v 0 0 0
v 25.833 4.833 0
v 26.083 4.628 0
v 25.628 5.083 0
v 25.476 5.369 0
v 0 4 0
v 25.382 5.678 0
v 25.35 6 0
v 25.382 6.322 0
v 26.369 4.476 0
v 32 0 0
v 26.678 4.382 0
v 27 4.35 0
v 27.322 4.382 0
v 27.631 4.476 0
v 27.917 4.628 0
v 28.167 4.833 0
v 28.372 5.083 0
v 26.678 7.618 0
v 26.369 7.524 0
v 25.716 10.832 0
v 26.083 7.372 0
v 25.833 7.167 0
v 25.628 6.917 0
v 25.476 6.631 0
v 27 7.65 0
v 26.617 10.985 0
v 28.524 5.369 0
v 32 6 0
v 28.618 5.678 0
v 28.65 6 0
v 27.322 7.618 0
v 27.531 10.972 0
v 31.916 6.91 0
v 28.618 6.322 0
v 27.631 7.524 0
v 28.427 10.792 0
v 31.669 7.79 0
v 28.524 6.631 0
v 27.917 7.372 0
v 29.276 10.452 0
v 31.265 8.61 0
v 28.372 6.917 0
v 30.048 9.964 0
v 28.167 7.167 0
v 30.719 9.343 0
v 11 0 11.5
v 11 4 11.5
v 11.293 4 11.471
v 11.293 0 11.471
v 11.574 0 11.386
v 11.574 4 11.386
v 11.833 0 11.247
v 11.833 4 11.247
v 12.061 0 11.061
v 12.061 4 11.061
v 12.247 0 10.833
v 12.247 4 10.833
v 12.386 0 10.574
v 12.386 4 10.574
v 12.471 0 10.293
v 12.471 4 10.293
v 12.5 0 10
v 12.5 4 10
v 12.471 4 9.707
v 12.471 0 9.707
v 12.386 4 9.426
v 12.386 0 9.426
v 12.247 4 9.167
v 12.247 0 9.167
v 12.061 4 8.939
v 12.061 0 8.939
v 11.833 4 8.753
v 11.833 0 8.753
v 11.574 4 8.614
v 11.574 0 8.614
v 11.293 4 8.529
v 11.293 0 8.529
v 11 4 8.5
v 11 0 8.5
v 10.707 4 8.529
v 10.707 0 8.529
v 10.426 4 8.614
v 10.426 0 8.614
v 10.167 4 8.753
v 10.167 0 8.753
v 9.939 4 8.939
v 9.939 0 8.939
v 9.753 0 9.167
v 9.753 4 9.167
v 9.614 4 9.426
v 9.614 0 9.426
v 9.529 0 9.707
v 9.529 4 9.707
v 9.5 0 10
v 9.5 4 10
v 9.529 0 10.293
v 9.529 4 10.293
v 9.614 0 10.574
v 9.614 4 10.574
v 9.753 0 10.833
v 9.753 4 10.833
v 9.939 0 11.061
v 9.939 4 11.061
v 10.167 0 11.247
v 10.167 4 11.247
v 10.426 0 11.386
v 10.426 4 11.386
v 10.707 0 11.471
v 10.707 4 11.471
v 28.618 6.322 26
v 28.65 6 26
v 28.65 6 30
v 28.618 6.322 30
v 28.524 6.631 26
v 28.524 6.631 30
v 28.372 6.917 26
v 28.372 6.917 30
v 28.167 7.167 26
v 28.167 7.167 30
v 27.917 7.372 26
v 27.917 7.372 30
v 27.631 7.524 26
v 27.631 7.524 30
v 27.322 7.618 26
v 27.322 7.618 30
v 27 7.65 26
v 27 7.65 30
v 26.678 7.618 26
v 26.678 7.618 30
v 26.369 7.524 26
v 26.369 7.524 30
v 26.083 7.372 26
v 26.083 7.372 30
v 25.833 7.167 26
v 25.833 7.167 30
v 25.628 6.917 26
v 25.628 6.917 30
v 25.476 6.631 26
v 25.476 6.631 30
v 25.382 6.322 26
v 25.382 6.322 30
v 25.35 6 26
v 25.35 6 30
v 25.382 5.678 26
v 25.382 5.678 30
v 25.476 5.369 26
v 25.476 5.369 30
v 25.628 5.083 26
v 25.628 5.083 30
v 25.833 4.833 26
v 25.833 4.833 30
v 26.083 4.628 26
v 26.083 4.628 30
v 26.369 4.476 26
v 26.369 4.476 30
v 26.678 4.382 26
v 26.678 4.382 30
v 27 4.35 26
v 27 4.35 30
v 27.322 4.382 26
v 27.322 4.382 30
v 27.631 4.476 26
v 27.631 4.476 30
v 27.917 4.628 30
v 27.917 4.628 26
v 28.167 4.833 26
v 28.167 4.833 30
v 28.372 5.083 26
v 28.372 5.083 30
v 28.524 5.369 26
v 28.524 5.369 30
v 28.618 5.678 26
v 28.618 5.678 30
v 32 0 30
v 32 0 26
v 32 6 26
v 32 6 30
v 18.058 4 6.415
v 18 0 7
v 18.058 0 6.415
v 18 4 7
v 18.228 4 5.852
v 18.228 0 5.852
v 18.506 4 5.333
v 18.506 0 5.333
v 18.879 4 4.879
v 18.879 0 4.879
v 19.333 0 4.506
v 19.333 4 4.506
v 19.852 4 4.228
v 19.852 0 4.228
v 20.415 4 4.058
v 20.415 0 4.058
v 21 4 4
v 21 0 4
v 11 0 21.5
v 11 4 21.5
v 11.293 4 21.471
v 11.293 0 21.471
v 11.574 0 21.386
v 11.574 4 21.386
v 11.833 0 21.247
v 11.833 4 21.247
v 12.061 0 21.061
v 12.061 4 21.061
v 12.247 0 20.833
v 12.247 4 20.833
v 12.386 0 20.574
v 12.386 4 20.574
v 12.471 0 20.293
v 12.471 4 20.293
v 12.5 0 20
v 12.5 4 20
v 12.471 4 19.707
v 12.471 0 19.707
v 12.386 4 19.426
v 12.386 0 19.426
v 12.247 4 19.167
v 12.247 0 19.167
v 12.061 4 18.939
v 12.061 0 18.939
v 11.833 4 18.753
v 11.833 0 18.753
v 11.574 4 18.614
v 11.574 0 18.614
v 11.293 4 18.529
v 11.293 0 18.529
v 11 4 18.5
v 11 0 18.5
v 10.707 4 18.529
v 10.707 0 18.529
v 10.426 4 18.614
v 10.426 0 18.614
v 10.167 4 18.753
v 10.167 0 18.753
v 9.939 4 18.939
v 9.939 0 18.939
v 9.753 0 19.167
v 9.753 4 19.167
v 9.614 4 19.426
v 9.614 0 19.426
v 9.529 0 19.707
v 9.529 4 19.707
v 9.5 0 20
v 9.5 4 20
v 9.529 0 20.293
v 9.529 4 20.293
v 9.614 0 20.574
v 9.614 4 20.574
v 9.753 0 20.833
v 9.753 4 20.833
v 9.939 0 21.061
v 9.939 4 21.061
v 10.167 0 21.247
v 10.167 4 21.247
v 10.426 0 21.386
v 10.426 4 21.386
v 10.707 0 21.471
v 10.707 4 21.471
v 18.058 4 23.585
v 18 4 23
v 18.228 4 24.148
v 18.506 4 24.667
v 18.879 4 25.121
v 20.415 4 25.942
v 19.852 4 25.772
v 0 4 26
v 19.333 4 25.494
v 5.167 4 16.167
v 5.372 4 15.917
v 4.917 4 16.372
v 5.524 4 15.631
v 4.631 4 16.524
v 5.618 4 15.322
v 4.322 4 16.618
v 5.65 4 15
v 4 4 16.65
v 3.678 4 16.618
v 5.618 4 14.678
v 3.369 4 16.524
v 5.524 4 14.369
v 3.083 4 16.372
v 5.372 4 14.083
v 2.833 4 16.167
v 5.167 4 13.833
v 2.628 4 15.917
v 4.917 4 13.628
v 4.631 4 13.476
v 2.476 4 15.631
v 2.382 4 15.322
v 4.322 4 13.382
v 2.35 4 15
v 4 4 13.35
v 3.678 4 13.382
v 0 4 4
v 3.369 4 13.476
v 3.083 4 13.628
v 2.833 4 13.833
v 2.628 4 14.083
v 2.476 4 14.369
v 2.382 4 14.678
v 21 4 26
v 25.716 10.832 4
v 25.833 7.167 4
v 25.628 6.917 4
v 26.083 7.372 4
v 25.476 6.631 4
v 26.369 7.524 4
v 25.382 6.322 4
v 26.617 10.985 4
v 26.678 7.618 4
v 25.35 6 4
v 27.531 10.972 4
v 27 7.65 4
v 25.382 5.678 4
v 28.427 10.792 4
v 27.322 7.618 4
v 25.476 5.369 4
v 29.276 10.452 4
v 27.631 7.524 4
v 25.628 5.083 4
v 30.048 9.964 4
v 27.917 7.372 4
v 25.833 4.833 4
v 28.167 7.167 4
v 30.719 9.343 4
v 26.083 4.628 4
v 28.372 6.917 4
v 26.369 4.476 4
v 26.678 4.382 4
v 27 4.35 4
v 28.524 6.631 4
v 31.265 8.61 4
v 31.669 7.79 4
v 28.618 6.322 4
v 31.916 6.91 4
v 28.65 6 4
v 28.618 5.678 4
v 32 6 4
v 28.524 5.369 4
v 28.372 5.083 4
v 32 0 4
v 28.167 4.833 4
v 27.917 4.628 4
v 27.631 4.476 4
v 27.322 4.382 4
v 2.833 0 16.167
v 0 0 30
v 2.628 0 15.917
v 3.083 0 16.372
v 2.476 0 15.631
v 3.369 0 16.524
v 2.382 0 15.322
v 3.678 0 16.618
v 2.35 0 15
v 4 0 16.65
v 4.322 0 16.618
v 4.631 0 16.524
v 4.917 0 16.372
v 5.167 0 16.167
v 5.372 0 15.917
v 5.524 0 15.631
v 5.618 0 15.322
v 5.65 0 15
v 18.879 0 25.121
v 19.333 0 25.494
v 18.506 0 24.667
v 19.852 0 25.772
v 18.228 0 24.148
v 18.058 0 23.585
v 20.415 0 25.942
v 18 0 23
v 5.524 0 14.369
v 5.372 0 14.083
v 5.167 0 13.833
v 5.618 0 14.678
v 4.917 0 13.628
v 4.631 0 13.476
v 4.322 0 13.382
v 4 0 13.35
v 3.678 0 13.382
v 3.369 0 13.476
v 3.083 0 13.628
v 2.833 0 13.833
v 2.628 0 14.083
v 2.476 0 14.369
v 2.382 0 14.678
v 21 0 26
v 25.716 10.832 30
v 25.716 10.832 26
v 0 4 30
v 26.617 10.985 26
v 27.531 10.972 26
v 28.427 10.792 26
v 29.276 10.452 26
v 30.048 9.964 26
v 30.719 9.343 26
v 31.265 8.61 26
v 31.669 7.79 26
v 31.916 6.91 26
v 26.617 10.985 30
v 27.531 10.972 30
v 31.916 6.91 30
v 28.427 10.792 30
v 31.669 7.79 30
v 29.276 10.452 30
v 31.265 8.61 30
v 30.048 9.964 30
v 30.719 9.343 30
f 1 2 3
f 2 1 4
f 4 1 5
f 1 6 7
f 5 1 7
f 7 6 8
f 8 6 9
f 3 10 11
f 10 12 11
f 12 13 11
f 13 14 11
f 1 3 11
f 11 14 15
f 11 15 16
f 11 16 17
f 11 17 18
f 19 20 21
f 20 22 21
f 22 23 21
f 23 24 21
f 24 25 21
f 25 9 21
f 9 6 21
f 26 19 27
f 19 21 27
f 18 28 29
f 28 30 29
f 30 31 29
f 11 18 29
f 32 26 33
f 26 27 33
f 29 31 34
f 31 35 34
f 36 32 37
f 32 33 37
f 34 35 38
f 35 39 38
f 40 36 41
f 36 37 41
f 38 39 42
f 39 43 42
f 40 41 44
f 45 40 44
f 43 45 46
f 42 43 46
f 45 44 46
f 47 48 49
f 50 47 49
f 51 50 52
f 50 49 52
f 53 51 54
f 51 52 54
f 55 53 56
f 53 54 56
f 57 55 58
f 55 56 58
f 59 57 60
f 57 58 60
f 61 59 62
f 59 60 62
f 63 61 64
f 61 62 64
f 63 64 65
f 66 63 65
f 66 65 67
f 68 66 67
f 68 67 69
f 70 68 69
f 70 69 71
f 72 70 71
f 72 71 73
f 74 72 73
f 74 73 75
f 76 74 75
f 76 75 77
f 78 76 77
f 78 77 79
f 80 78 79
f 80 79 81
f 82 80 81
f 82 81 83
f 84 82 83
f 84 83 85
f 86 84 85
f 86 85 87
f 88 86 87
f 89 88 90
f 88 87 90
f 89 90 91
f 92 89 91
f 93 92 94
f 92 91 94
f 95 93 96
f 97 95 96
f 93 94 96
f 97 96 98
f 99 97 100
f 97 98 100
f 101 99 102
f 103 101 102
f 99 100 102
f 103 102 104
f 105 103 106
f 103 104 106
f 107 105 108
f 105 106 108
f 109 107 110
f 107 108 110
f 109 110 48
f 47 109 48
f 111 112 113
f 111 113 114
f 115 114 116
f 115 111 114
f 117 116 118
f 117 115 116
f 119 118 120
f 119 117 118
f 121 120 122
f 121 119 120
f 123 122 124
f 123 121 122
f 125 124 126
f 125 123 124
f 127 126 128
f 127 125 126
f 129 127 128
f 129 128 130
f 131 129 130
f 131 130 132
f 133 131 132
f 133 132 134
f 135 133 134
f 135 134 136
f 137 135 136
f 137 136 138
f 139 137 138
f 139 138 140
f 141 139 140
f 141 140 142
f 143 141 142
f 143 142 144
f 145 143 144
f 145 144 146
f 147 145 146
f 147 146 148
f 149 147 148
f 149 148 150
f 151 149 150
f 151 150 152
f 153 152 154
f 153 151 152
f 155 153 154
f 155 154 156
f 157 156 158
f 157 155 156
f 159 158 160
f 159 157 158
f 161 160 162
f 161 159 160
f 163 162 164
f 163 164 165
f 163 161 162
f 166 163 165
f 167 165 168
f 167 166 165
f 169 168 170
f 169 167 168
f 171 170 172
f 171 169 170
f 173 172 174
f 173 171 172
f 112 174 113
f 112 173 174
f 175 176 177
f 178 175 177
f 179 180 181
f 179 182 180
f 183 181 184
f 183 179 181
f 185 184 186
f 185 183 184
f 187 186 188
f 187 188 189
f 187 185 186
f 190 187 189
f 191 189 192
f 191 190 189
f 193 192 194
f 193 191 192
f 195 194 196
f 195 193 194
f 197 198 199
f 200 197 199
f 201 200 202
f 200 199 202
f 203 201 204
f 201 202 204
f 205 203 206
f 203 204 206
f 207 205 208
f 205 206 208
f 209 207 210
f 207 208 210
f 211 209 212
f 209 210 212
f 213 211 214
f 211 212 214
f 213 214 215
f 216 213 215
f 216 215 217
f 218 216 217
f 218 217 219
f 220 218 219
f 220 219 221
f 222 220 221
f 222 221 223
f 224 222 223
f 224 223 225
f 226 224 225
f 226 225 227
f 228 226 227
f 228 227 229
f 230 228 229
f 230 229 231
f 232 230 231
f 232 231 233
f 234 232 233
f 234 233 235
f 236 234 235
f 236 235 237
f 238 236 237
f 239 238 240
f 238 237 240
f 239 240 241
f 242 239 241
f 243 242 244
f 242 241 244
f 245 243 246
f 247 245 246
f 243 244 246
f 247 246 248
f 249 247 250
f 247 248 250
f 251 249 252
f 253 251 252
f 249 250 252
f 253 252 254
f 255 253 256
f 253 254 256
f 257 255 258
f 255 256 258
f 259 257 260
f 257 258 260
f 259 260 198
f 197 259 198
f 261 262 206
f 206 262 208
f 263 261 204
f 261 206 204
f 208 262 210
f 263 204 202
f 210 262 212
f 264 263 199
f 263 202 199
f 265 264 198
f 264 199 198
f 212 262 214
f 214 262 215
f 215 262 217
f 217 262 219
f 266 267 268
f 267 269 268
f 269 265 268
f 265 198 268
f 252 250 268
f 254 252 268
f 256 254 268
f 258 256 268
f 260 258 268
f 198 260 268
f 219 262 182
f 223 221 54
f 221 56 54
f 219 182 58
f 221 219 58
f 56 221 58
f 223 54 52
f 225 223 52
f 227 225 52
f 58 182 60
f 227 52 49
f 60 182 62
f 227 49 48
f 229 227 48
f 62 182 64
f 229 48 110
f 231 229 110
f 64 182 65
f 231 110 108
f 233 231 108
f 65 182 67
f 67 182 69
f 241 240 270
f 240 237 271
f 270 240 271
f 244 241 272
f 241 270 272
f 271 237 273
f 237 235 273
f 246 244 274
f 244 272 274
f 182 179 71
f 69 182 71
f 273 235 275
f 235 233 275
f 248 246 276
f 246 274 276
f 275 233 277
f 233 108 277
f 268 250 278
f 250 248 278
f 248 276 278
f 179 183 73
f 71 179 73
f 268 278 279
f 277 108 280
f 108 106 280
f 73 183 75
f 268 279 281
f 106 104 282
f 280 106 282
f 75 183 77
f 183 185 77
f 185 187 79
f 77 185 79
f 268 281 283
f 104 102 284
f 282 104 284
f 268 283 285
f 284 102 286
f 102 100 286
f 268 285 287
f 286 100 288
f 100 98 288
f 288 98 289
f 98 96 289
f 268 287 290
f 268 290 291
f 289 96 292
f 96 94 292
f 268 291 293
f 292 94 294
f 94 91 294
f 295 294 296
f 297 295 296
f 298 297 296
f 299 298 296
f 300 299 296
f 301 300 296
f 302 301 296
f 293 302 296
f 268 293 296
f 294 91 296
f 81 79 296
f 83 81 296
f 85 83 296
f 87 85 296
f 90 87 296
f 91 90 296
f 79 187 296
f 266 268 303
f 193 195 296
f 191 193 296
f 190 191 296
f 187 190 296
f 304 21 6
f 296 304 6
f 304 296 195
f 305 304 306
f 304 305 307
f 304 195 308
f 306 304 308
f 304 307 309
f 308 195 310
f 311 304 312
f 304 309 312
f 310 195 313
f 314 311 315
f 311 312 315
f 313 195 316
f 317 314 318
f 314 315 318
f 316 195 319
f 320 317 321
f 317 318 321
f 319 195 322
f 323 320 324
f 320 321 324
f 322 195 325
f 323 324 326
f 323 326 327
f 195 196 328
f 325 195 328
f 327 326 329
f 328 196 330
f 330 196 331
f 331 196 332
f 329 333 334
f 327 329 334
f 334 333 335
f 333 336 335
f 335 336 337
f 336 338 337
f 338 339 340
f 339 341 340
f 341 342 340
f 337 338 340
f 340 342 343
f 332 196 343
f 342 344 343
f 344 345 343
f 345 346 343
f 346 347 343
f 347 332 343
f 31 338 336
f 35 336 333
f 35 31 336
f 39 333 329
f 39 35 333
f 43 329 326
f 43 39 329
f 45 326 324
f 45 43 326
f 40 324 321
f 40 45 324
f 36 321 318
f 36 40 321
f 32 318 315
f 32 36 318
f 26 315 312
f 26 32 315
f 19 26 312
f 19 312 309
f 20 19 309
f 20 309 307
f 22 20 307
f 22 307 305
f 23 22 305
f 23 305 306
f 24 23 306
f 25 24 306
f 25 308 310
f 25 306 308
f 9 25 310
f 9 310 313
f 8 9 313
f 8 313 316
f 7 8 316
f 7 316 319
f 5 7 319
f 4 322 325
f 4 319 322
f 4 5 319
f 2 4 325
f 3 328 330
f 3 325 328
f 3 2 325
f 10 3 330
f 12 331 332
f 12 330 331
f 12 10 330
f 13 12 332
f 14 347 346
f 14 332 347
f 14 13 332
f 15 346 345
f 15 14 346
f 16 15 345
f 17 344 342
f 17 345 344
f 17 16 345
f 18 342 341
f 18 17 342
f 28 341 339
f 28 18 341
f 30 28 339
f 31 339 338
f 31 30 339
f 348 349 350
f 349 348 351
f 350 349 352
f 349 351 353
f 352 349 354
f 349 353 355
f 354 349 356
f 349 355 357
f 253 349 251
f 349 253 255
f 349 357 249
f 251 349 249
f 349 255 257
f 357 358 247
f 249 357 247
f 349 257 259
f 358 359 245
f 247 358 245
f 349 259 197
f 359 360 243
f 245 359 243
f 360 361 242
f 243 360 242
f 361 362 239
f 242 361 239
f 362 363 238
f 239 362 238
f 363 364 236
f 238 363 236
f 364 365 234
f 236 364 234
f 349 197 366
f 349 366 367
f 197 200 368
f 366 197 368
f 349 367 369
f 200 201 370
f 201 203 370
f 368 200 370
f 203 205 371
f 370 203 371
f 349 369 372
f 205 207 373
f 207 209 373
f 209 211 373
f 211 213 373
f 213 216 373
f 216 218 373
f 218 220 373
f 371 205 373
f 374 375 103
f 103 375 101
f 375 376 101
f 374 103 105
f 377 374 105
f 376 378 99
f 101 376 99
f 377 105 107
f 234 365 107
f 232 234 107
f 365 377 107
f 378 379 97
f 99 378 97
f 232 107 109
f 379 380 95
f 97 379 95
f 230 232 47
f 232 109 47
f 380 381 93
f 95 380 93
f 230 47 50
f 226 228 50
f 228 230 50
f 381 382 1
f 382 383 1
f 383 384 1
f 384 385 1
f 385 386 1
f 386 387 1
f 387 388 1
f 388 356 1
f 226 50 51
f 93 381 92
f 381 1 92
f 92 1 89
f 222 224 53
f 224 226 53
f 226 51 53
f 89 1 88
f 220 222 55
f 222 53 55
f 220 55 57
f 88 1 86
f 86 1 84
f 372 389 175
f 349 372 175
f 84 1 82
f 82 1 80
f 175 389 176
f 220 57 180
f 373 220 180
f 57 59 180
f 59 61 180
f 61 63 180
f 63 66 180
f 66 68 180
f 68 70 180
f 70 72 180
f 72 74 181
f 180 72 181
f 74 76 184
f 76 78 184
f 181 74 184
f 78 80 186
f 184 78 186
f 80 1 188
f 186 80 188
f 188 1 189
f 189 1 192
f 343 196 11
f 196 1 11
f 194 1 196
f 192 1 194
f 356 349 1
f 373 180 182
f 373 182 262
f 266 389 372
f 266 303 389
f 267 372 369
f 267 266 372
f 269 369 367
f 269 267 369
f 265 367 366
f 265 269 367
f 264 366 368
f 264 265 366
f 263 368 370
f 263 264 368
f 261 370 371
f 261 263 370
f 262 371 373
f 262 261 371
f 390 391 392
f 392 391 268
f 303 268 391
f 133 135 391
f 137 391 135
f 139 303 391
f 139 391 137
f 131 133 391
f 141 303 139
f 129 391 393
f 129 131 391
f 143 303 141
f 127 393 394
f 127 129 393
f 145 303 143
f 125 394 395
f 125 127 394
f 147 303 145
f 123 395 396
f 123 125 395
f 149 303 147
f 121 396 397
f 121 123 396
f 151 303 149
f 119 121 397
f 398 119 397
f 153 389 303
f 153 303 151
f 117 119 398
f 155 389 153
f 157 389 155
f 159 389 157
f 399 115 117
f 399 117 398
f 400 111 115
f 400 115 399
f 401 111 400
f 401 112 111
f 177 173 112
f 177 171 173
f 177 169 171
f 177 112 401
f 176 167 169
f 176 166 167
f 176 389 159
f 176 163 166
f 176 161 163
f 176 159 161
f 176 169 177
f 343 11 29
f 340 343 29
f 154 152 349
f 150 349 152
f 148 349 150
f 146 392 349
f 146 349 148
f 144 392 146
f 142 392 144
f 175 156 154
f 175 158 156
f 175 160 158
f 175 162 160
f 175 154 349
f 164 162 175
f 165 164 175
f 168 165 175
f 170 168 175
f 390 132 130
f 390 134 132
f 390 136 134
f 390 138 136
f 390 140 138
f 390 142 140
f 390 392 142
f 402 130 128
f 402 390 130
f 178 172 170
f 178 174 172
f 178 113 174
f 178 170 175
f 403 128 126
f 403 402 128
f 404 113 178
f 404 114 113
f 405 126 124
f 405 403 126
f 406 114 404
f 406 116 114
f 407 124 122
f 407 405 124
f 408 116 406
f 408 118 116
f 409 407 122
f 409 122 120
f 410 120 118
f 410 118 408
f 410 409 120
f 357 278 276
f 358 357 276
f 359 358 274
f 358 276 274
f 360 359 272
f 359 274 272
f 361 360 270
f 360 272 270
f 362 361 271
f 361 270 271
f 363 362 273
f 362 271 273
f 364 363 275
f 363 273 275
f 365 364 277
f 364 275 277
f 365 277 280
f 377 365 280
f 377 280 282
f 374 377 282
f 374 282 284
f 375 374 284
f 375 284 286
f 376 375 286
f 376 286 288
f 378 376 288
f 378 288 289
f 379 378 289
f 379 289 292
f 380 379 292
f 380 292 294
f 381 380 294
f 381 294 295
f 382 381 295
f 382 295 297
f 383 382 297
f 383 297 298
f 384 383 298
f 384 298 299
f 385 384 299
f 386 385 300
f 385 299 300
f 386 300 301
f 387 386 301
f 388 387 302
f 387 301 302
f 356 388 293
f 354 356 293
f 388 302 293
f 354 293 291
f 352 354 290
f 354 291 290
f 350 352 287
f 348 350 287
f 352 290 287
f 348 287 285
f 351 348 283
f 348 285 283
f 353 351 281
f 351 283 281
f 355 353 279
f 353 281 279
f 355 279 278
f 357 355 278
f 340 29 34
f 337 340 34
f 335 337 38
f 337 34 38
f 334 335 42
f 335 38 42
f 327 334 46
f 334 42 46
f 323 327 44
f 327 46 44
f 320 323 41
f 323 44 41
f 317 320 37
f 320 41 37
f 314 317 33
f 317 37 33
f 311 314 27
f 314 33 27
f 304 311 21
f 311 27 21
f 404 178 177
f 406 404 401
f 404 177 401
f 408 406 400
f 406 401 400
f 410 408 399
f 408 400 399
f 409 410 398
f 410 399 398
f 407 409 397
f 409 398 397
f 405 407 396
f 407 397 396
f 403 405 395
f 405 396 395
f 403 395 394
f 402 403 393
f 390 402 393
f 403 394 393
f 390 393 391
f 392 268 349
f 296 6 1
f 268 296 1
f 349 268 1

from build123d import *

# Parameters (mm, degrees)
SKETCH_1_R          = 1.65
EXTRUDE_1_DEPTH     = 30
SKETCH_2_W          = 14
SKETCH_2_H          = 22
CUT_EXTRUDE_1_DEPTH = 30
SKETCH_3_W          = 18
SKETCH_3_H          = 22
CUT_EXTRUDE_2_DEPTH = 30
FILLET_1_R          = 3
SKETCH_4_R          = 1.65
CUT_EXTRUDE_3_DEPTH = 30
SKETCH_5_R          = 1.5
CUT_EXTRUDE_4_DEPTH = 45.418464629


with BuildPart() as part:
    # 草图1 → 凸台-拉伸1 (new body)
    with BuildSketch(Plane.XY):
        with BuildLine():
            Line((0, 0), (32, 0))
            Line((32, 0), (32, 6))
            ThreePointArc((32, 6), (30.048000097, 9.963545813), (25.716121836, 10.832355208))
            Line((25.716121836, 10.832355208), (0, 4))
            Line((0, 4), (0, 0))
        make_face()
        with Locations((27, 6)):
            Circle(SKETCH_1_R, mode=Mode.SUBTRACT)
    extrude(amount=EXTRUDE_1_DEPTH)

    # 草图2 → 切除-拉伸1 (cut)
    with BuildSketch(Plane.XZ):
        with Locations((25, 15)):
            Rectangle(SKETCH_2_W, SKETCH_2_H)
    extrude(amount=-CUT_EXTRUDE_1_DEPTH, mode=Mode.SUBTRACT)

    # 草图3 → 切除-拉伸2 (cut)
    with BuildSketch(Plane(origin=(0, 4, 0), x_dir=(-1, 0, 0), z_dir=(0, -1, 0))):
        with Locations((-9, -15)):
            Rectangle(SKETCH_3_W, SKETCH_3_H)
    extrude(amount=-CUT_EXTRUDE_2_DEPTH, mode=Mode.SUBTRACT)

    # 圆角1
    fillet_1_edges = [part.edges().sort_by_distance(p)[0] for p in [
        (18, 2, 26),
        (18, 2, 4),
    ]]
    fillet(fillet_1_edges, radius=FILLET_1_R)

    # 草图4 → 切除-拉伸3 (cut)
    with BuildSketch(Plane(origin=(0, 4, 0), x_dir=(1, 0, 0), z_dir=(0, 1, 0))):
        with Locations(Location((4, -15, 0), (0, 0, 270))):
            Circle(SKETCH_4_R)
    extrude(amount=-CUT_EXTRUDE_3_DEPTH, mode=Mode.SUBTRACT)

    # 草图5 → 切除-拉伸4 (cut, through all)
    with BuildSketch(Plane(origin=(0, 4, 0), x_dir=(1, 0, 0), z_dir=(0, 1, 0))):
        with Locations(Location((11, -10, 0), (0, 0, 270))):
            Circle(SKETCH_5_R)
        with Locations(Location((11, -20, 0), (0, 0, 270))):
            Circle(SKETCH_5_R)
    extrude(amount=-CUT_EXTRUDE_4_DEPTH, mode=Mode.SUBTRACT)


solid = part.part
